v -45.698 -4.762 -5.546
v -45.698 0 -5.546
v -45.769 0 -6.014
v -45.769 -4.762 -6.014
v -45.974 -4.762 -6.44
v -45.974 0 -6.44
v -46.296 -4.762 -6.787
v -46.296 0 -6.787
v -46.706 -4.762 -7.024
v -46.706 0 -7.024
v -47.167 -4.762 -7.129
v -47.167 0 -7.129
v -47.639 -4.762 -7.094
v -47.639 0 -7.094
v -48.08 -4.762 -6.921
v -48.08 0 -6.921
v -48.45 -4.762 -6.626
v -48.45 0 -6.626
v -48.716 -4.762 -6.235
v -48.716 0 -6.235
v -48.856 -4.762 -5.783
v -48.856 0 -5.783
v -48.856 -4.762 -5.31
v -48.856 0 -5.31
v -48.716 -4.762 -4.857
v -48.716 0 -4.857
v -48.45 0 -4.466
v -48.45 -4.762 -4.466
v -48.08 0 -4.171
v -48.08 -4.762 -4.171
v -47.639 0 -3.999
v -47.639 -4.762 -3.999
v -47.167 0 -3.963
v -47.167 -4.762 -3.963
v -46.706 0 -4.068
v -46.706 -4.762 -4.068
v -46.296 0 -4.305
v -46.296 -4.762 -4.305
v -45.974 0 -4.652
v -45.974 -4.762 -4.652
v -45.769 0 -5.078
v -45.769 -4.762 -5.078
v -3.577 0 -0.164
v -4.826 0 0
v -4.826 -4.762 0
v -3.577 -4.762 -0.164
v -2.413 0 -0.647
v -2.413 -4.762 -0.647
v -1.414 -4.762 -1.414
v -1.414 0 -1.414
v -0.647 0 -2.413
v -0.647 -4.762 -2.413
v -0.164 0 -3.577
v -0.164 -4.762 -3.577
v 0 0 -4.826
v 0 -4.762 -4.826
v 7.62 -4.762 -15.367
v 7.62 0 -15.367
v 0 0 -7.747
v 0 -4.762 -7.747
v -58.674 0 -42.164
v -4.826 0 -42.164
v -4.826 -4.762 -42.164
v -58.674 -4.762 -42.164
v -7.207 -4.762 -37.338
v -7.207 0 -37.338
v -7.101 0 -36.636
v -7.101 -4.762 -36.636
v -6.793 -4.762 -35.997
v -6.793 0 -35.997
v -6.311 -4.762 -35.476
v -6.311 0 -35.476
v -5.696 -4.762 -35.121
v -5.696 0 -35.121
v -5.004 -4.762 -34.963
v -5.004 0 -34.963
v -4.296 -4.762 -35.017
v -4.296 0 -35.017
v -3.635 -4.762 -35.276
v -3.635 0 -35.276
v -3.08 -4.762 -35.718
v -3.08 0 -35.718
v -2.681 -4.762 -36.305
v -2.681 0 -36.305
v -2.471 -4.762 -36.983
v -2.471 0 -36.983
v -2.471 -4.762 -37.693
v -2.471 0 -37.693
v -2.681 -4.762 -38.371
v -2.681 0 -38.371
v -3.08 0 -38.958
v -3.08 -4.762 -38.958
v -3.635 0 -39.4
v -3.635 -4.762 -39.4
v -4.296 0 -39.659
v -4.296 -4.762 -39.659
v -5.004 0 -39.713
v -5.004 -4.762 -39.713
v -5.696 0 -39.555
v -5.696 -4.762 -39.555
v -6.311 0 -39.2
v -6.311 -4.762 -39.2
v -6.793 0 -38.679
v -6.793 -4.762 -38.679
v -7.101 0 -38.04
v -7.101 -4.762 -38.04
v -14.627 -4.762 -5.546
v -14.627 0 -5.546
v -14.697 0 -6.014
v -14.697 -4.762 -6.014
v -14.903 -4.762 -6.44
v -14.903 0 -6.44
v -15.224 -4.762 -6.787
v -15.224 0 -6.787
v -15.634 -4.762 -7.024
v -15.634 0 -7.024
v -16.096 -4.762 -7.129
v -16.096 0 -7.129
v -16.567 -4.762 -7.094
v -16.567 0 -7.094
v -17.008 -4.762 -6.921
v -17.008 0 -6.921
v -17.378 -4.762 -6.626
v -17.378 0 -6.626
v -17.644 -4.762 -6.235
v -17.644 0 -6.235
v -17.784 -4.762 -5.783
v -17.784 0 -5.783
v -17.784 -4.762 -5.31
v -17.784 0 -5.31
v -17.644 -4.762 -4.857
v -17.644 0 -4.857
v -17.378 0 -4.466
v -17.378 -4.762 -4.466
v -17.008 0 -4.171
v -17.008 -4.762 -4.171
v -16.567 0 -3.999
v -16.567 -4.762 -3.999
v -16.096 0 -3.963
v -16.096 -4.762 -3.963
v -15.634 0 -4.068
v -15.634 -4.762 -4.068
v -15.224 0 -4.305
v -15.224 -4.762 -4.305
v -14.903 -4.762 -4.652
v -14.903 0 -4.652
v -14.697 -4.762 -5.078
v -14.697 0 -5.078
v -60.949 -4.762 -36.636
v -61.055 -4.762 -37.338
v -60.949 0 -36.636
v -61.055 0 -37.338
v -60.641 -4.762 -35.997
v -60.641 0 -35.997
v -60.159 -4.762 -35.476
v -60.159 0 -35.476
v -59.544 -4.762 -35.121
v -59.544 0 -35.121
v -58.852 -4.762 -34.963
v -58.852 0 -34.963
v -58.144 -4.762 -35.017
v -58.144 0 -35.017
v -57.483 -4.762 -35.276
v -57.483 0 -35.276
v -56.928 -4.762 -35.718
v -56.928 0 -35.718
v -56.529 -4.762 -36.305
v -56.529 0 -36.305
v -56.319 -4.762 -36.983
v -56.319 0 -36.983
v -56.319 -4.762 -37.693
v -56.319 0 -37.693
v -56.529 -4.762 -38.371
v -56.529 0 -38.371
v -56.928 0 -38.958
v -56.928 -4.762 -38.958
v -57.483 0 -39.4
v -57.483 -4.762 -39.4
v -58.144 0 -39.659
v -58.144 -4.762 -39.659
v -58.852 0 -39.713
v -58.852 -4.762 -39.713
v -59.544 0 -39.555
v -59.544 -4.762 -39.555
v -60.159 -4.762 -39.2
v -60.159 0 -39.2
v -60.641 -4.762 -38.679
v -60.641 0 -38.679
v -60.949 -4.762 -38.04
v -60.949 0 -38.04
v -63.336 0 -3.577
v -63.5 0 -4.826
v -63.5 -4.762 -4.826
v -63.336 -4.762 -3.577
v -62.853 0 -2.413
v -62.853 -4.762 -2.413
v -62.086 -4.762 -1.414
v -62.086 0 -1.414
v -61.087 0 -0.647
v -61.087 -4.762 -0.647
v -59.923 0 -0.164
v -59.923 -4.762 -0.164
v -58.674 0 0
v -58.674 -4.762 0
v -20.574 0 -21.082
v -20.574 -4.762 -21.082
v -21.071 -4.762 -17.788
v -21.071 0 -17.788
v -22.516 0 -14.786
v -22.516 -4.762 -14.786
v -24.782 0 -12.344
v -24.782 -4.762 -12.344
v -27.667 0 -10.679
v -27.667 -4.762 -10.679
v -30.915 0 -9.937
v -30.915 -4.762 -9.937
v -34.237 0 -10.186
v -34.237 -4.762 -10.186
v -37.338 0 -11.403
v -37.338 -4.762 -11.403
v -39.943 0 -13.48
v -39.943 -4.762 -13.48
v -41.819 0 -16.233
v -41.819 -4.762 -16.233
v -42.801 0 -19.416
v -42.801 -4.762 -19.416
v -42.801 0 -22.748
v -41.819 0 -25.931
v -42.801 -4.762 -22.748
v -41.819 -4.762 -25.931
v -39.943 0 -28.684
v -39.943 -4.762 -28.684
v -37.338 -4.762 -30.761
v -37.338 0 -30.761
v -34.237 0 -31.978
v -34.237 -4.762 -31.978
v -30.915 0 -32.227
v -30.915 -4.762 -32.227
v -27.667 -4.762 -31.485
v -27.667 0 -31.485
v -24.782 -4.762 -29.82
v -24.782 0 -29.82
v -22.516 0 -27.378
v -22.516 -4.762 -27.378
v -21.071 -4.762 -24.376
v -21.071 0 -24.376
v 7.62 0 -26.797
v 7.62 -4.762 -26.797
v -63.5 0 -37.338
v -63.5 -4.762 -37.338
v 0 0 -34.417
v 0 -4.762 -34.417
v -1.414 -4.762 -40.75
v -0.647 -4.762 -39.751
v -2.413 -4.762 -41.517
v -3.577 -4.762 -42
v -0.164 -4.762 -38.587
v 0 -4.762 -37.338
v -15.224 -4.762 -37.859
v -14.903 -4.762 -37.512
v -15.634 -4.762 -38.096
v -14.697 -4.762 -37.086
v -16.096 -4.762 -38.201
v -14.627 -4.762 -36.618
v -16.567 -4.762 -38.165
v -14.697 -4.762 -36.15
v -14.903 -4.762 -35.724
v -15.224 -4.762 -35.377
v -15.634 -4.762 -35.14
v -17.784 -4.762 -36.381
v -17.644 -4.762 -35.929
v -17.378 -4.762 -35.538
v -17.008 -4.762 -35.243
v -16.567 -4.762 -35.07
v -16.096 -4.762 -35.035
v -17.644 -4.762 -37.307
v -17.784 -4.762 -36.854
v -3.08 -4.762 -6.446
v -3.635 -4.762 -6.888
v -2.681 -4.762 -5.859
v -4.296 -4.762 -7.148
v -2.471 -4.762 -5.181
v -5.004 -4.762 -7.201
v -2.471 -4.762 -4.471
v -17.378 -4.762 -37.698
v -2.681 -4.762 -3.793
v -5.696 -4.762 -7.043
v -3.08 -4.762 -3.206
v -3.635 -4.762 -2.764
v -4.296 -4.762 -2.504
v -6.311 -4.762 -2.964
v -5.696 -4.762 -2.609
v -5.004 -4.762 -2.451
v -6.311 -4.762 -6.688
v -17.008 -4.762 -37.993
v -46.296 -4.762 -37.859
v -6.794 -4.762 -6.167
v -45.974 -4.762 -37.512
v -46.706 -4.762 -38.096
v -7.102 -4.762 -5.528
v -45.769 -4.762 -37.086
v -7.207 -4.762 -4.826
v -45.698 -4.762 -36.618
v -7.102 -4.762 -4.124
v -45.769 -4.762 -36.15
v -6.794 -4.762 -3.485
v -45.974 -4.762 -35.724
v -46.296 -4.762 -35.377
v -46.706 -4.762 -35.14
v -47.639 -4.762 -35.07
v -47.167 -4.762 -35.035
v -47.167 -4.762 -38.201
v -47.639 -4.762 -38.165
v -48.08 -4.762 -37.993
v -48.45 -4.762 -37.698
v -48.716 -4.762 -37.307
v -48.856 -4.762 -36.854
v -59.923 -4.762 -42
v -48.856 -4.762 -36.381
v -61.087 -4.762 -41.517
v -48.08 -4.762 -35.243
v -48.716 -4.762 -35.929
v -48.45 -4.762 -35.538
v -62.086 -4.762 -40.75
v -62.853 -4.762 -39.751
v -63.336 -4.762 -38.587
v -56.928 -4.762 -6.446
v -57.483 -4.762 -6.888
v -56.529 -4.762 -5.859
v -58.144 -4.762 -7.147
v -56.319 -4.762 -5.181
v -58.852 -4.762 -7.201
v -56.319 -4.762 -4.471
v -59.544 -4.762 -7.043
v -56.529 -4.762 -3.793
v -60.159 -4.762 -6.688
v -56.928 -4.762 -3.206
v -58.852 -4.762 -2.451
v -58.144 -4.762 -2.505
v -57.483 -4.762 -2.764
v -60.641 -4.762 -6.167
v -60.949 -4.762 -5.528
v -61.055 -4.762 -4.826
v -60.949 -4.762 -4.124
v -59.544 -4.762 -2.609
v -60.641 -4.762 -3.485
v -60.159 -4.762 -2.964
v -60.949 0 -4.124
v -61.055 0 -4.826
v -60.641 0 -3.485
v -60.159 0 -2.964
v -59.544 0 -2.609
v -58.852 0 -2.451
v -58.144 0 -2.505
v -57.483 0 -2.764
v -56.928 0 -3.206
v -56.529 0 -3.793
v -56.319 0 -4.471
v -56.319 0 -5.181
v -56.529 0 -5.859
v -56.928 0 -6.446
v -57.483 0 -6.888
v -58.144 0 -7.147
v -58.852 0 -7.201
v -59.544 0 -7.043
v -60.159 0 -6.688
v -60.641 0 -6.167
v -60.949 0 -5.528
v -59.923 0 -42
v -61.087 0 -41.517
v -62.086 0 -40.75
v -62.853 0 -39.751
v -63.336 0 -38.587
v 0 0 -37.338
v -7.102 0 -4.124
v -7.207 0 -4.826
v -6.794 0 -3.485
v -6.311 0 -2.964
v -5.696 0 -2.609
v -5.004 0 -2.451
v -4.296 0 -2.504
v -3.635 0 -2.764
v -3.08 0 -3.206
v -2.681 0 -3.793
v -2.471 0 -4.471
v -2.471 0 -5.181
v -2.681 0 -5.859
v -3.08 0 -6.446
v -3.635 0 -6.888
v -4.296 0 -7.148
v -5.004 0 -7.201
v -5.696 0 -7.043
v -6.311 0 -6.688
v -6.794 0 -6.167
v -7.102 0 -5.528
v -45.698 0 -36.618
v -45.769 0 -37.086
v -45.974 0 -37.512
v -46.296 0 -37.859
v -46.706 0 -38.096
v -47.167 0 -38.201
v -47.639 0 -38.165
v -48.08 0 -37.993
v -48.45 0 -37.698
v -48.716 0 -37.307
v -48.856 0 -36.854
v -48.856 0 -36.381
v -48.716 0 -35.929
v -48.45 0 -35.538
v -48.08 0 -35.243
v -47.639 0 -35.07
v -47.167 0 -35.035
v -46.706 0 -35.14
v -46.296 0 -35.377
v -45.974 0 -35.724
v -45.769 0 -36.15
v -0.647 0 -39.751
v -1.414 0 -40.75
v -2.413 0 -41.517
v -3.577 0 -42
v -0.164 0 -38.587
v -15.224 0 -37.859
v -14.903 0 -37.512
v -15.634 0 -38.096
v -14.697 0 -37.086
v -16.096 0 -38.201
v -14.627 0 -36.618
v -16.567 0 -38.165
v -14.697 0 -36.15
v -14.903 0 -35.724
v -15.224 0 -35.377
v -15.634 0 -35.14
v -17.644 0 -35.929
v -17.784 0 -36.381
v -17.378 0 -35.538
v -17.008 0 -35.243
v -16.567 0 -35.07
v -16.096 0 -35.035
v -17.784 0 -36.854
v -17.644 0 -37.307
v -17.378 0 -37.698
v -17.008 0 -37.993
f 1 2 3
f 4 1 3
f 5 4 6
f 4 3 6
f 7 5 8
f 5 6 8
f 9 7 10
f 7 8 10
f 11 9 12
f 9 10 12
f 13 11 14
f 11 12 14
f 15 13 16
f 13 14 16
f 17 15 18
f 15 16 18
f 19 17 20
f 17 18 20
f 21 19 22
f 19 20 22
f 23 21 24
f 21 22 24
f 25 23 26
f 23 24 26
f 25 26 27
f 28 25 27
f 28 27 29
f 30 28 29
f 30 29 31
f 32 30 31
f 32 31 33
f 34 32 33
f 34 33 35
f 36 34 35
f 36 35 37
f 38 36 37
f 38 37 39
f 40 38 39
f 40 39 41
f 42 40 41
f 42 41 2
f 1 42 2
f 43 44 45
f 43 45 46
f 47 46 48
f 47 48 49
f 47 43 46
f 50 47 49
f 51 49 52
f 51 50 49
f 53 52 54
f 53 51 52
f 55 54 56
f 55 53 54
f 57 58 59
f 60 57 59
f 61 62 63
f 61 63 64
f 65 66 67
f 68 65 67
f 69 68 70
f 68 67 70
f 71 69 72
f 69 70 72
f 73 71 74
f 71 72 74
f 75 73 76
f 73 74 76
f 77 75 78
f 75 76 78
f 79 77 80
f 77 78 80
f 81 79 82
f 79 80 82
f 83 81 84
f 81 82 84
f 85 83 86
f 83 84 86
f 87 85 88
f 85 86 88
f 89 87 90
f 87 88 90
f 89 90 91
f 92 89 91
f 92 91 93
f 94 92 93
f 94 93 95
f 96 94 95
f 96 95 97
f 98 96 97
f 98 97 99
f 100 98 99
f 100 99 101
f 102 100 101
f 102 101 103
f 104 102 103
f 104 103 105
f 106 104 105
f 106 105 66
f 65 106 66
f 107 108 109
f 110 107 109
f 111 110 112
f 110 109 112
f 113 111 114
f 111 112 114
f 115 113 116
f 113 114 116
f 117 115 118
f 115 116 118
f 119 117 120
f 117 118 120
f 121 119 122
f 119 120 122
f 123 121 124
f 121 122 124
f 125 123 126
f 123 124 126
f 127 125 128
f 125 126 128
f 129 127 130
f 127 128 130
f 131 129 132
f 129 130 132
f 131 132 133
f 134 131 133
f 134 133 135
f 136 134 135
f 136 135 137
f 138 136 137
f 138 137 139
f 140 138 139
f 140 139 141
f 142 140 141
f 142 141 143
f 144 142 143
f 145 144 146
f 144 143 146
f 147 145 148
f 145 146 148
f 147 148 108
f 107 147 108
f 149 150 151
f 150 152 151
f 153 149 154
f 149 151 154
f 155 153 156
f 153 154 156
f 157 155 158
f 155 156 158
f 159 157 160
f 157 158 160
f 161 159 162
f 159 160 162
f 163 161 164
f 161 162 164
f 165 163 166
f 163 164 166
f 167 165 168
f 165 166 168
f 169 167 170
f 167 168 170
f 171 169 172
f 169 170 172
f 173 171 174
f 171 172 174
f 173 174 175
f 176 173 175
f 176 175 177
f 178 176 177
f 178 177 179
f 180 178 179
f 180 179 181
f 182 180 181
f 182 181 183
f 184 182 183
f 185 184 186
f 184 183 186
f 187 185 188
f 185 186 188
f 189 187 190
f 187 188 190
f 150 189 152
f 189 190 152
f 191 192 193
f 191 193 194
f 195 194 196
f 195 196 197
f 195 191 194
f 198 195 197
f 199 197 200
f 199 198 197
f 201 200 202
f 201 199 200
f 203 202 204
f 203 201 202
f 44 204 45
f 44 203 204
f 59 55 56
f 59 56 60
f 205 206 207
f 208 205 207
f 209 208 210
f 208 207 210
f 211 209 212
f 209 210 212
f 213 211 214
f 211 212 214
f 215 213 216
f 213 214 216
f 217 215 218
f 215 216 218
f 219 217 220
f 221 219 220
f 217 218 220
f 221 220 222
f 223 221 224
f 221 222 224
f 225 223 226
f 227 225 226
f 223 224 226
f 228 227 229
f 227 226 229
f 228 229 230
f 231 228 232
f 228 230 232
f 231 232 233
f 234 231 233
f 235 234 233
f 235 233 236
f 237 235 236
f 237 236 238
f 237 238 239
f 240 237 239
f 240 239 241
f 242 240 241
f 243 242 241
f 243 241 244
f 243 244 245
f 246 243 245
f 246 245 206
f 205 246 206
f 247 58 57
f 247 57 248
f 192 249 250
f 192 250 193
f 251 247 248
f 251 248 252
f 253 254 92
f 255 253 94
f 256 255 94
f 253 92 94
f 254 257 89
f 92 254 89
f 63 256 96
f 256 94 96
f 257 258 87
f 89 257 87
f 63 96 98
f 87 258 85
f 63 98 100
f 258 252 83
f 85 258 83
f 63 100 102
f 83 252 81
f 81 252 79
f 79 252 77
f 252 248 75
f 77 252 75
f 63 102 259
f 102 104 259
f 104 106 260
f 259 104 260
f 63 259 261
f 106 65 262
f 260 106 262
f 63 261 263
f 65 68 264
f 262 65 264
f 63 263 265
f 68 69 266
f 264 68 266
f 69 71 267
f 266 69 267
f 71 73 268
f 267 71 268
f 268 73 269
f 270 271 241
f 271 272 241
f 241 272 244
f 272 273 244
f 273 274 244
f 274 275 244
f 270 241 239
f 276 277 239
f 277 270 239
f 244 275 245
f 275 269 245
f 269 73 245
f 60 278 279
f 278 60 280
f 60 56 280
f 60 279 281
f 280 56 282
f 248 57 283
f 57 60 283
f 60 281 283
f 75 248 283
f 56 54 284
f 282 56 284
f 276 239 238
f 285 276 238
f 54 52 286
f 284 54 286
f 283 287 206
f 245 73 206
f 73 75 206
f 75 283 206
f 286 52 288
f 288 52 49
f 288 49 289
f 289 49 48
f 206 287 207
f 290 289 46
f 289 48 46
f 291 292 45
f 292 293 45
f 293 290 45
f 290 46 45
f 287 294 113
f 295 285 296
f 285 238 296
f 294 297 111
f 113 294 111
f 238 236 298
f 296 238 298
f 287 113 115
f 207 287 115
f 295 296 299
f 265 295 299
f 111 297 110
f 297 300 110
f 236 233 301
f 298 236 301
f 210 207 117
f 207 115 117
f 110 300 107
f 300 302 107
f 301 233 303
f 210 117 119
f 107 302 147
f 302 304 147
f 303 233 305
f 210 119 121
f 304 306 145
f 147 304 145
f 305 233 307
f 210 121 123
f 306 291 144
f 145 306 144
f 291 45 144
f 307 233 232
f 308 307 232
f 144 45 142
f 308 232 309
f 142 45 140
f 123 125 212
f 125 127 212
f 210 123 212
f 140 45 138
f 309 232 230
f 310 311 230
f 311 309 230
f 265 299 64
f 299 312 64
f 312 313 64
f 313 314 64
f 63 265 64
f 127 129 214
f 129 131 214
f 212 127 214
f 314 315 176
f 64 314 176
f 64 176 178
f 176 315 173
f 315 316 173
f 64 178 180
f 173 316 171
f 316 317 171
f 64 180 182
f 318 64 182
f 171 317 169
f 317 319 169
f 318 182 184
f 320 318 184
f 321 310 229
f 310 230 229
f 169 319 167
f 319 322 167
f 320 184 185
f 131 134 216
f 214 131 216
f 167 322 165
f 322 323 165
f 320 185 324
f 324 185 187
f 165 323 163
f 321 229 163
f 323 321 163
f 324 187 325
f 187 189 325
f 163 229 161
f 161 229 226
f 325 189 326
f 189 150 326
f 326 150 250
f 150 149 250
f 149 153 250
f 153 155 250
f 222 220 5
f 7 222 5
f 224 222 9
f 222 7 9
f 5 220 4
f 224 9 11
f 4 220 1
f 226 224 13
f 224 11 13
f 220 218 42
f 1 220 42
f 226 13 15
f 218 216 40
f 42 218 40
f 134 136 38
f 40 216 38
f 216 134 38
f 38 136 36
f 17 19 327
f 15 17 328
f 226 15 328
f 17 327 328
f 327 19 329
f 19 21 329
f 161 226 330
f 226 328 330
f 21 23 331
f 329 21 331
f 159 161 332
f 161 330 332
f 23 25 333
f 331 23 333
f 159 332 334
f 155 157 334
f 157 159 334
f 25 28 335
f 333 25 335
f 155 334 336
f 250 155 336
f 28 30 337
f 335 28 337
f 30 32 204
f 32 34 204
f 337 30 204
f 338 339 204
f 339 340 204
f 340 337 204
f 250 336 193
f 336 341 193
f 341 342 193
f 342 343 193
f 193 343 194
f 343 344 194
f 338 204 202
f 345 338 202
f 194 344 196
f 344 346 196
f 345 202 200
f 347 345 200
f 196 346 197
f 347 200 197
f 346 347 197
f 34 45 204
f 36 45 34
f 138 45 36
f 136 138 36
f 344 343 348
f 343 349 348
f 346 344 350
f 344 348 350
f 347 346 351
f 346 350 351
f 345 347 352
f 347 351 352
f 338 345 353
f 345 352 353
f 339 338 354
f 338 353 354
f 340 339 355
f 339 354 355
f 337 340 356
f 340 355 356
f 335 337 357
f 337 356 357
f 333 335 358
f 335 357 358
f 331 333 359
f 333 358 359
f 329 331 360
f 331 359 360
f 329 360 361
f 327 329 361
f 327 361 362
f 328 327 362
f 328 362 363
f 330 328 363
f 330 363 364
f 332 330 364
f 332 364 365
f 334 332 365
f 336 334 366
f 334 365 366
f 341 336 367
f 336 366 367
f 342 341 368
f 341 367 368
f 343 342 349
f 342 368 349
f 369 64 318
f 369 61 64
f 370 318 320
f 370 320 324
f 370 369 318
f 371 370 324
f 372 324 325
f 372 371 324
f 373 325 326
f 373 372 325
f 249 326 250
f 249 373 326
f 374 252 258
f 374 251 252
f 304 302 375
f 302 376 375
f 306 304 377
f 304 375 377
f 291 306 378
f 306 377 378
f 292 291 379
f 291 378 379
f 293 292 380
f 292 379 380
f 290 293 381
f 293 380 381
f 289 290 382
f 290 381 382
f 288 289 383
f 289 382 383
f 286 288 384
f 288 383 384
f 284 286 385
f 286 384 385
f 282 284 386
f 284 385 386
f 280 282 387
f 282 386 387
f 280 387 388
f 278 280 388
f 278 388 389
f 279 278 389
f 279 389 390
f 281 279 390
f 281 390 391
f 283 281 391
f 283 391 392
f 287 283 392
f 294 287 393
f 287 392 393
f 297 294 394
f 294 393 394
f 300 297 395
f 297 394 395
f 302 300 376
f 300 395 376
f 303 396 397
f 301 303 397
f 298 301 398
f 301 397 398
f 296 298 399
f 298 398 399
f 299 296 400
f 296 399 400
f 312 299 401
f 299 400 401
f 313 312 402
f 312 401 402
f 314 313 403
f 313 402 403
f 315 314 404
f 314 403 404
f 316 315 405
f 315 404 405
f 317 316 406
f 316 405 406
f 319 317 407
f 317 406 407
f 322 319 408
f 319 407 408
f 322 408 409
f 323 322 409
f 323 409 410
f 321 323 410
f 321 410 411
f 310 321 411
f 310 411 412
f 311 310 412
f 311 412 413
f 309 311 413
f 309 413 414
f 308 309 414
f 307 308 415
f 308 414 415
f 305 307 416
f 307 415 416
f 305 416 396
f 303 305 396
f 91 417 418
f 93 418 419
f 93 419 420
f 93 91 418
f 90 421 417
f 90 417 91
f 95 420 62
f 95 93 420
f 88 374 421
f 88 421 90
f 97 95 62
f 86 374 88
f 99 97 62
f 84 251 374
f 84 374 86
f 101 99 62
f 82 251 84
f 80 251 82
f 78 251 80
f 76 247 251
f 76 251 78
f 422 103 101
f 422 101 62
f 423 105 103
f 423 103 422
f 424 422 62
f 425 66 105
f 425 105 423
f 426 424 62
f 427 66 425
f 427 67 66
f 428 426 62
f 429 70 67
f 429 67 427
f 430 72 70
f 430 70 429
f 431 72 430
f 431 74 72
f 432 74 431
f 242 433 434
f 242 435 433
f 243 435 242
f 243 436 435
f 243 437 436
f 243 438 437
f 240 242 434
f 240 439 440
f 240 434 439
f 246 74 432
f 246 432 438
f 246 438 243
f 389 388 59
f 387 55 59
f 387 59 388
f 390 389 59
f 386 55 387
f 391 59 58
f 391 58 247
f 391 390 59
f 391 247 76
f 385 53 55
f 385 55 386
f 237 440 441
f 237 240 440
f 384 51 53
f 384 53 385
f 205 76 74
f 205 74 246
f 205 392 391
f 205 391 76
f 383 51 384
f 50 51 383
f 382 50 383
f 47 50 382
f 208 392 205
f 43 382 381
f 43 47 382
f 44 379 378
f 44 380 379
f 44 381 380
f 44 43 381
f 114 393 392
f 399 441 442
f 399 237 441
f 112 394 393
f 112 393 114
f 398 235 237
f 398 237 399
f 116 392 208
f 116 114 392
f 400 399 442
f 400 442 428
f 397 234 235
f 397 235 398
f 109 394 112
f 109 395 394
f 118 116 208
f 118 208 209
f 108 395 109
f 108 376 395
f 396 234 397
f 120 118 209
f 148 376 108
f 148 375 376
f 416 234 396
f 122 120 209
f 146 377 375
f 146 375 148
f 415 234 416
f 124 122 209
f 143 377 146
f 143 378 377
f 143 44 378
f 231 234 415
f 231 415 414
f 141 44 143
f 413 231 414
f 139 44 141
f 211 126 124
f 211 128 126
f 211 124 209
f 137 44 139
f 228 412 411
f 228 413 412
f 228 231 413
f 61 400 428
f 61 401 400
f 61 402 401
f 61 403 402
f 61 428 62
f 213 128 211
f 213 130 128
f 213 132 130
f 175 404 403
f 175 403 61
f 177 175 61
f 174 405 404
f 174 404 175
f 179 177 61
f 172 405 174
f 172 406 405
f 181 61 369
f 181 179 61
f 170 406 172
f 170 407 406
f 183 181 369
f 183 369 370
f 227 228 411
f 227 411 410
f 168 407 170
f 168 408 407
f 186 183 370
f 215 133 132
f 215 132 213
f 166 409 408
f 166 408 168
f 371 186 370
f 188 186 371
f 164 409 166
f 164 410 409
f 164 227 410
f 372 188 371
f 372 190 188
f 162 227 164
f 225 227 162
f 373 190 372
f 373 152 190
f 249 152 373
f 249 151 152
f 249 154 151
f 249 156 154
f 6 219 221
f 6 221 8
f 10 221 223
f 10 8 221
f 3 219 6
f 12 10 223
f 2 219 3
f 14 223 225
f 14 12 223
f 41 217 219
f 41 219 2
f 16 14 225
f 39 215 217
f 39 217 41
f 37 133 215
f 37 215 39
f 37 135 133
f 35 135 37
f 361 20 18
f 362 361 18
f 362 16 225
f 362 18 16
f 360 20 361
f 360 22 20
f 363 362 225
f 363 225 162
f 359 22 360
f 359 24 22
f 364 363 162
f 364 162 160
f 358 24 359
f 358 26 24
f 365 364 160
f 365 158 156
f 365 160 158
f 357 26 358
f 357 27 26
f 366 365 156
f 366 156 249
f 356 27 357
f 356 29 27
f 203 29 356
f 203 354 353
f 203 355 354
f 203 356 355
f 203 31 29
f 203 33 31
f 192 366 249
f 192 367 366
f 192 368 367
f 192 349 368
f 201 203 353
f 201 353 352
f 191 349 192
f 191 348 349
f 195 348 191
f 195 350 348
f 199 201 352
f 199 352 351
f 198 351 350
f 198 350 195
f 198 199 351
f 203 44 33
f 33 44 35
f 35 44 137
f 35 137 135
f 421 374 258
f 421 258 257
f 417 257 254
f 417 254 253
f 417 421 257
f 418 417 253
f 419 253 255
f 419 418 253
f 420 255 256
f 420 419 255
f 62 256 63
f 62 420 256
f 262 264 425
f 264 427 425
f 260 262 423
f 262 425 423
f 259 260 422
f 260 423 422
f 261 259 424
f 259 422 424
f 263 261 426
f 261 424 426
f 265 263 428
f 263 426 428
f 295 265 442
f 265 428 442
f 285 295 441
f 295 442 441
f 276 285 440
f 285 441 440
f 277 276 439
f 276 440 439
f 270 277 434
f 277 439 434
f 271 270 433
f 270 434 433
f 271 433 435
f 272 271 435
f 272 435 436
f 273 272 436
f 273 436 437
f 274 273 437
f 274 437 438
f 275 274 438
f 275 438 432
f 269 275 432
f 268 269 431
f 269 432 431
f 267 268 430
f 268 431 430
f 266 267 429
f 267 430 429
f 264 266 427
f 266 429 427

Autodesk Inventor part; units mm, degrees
ref_plane "YZ Plane" through (0, 0, 0) normal (1, 0, 0) x (0, 1, 0)
ref_plane "XZ Plane" through (0, 0, 0) normal (0, 1, 0) x (-1, 0, 0)
ref_plane "XY Plane" through (0, 0, 0) normal (0, 0, 1) x (1, 0, 0)
sketch "Sketch1" plane through (0, 0, 0) normal (0, 1, 0) x (-1, 0, 0)
  line L0 (0, -4.826) -> (0, -37.338)
  line L1 (4.826, -42.164) -> (58.674, -42.164)
  line L2 (63.5, -37.338) -> (63.5, -4.826)
  line L3 (58.674, 0) -> (4.826, 0)
  arc A0 (4.826, 0) -> (0, -4.826) centre (4.826, -4.826) ccw
  arc A1 (63.5, -4.826) -> (58.674, 0) centre (58.674, -4.826) ccw
  arc A2 (58.674, -42.164) -> (63.5, -37.338) centre (58.674, -37.338) ccw
  arc A3 (0, -37.338) -> (4.826, -42.164) centre (4.826, -37.338) ccw
  circle A4 centre (4.826, -4.826) radius 4.826
  circle A5 centre (4.826, -37.338) radius 4.826
  circle A6 centre (58.674, -37.338) radius 4.826
  circle A7 centre (58.674, -4.826) radius 4.826
  circle A8 centre (58.674, -4.826) radius 2.3812
  circle A9 centre (58.674, -37.338) radius 2.3812
  circle A10 centre (4.826, -37.338) radius 2.3812
  circle A11 centre (4.826, -4.826) radius 2.3813
  point P0 (0, 0)
  point P1 (0, -42.164)
  point P2 (63.5, -42.164)
  dimension "d0" = 42.164
  dimension "d1" = 63.5
  dimension "d2" = 4.826
  dimension "d3" = 4.7625
  dimension "d4" = 4.7625
  dimension "d5" = 4.7625
extrude "Extrusion1" add sketch "Sketch1" against normal blind 4.7625
sketch "Sketch2" plane through (0, -4.7625, 0) normal (0, -1, 0) x (1, 0, 0)
  line L0 (0, -37.338) -> (0, -4.826) projected
  line L1 (0, -21.082) -> (-63.5, -21.082)
  line L2 (-63.5, -4.826) -> (-63.5, -37.338) projected
  line L3 (-58.674, -42.164) -> (-4.826, -42.164) projected
  line L4 (-31.75, -42.164) -> (-31.75, 0)
  circle A0 centre (-31.75, -21.082) radius 11.176
  line L5 (-31.75, -21.082) -> (-16.2142, -5.5462)
  line L6 (-31.75, -21.082) -> (-9.779, -21.082) construction
  line L7 (-31.75, -21.082) -> (-47.2858, -5.5462)
  line L8 (-47.2858, -5.5462) -> (-31.75, -21.082)
  line L9 (-31.75, -21.082) -> (-47.2858, -36.6178)
  line L10 (-47.2858, -36.6178) -> (-31.75, -21.082)
  line L11 (-31.75, -21.082) -> (-16.2142, -36.6178)
  circle A1 centre (-16.2142, -5.5462) radius 1.27
  circle A2 centre (-16.2142, -36.6178) radius 1.27
  circle A3 centre (-47.2858, -36.6178) radius 1.27
  circle A4 centre (-47.2858, -5.5462) radius 1.27
  point P0 (0, 0)
  dimension "d8" = 22.352
  dimension "d9" = 21.971
  dimension "d10" = 45
  dimension "d11" = 21.971
  dimension "d12" = 21.971
  dimension "d13" = 2.54
  dimension "d14" = 2.54
  dimension "d15" = 2.54
  dimension "d16" = 2.54
extrude "Extrusion2" cut sketch "Sketch2" against normal blind 21.971
sketch "Sketch3" plane through (0, -4.7625, 0) normal (0, -1, 0) x (1, 0, 0)
  point P0 (0, 0)
sketch "Sketch4" plane through (0, 0, 0) normal (0, 1, 0) x (1, 0, 0)
  line L0 (0, 4.826) -> (0, 37.338) projected
  line L1 (0, 21.082) -> (0, 15.367)
  line L2 (0, 15.367) -> (0, 21.082)
  line L3 (0, 21.082) -> (0, 26.797)
  line L4 (0, 15.367) -> (7.62, 15.367)
  line L5 (7.62, 15.367) -> (7.62, 26.797)
  line L6 (7.62, 26.797) -> (0, 26.797)
  line L7 (7.62, 15.367) -> (0, 7.747)
  line L8 (7.62, 15.367) -> (18.3963, 15.367) construction
  line L9 (7.62, 26.797) -> (0, 34.417)
  line L10 (0, 15.367) -> (-6.35, 15.367)
  line L11 (-6.35, 15.367) -> (-6.35, 26.797)
  line L12 (-6.35, 26.797) -> (0, 26.797)
  point P0 (0, 0)
  dimension "d19" = 5.715
  dimension "d20" = 5.715
  dimension "d21" = 7.62
  dimension "d22" = 135
  dimension "d23" = 6.35
extrude "Extrusion3" add sketch "Sketch4" against normal blind 4.7625 contours L0 L4 L7 | L6 L0 L9
extrude "Extrusion4" add sketch "Sketch4" against normal blind 9.525 contours L10 L11 L12 L0 | L0 L6 L5 L4
sketch "Sketch5" plane through (7.62, 0, -15.367) normal (1, 0, 0) x (0, 0, -1)
  line L0 (11.43, -4.7625) -> (0, -4.7625) projected
  line L1 (5.715, -4.7625) -> (5.715, -12.3825)
  circle A0 centre (5.715, -12.3825) radius 5.715
  point P0 (-15.367, 0)
  dimension "d28" = 7.62
  dimension "d29" = 11.43
extrude "Extrusion5" cut sketch "Sketch5" against normal blind 9.9441
sketch "Sketch6" plane through (0, 0, 0) normal (0, 1, 0) x (1, 0, 0)
  circle A0 centre (-16.2142, 5.5462) radius 1.27 projected
  circle A1 centre (-16.2142, 5.5462) radius 1.5875
  circle A2 centre (-47.2858, 5.5462) radius 1.27 projected
  circle A3 centre (-47.2858, 5.5462) radius 1.5875
  circle A4 centre (-47.2858, 36.6178) radius 1.27 projected
  circle A5 centre (-47.2858, 36.6178) radius 1.5875
  circle A6 centre (-16.2142, 36.6178) radius 1.27 projected
  circle A7 centre (-16.2142, 36.6178) radius 1.5875
  point P0 (0, 0)
  dimension "d46" = 3.175
  dimension "d47" = 3.175
  dimension "d48" = 3.175
  dimension "d49" = 3.175
extrude "Extrusion6" cut sketch "Sketch6" against normal up to surface (4.7625 mm away)
sketch "Sketch7" plane through (-6.35, -9.525, -26.797) normal (-1, 0, 0) x (0, 0, 1)
  line L0 (0, 4.7625) -> (0, 0) projected
  line L1 (0, 4.7625) -> (11.43, 4.7625) projected
  line L2 (0, 0) -> (11.43, 0)
  line L3 (11.43, 0) -> (11.43, 4.7625)
  line L4 (11.43, 4.7625) -> (0, 4.7625)
  line L5 (0, 4.7625) -> (0, 0)
  point P0 (26.797, 9.525)
extrude "Extrusion7" cut sketch "Sketch7" against normal up to surface (13.97 mm away)
equation "\"d17\" = d9"
properties part number "MotorTop_3DPrint"
